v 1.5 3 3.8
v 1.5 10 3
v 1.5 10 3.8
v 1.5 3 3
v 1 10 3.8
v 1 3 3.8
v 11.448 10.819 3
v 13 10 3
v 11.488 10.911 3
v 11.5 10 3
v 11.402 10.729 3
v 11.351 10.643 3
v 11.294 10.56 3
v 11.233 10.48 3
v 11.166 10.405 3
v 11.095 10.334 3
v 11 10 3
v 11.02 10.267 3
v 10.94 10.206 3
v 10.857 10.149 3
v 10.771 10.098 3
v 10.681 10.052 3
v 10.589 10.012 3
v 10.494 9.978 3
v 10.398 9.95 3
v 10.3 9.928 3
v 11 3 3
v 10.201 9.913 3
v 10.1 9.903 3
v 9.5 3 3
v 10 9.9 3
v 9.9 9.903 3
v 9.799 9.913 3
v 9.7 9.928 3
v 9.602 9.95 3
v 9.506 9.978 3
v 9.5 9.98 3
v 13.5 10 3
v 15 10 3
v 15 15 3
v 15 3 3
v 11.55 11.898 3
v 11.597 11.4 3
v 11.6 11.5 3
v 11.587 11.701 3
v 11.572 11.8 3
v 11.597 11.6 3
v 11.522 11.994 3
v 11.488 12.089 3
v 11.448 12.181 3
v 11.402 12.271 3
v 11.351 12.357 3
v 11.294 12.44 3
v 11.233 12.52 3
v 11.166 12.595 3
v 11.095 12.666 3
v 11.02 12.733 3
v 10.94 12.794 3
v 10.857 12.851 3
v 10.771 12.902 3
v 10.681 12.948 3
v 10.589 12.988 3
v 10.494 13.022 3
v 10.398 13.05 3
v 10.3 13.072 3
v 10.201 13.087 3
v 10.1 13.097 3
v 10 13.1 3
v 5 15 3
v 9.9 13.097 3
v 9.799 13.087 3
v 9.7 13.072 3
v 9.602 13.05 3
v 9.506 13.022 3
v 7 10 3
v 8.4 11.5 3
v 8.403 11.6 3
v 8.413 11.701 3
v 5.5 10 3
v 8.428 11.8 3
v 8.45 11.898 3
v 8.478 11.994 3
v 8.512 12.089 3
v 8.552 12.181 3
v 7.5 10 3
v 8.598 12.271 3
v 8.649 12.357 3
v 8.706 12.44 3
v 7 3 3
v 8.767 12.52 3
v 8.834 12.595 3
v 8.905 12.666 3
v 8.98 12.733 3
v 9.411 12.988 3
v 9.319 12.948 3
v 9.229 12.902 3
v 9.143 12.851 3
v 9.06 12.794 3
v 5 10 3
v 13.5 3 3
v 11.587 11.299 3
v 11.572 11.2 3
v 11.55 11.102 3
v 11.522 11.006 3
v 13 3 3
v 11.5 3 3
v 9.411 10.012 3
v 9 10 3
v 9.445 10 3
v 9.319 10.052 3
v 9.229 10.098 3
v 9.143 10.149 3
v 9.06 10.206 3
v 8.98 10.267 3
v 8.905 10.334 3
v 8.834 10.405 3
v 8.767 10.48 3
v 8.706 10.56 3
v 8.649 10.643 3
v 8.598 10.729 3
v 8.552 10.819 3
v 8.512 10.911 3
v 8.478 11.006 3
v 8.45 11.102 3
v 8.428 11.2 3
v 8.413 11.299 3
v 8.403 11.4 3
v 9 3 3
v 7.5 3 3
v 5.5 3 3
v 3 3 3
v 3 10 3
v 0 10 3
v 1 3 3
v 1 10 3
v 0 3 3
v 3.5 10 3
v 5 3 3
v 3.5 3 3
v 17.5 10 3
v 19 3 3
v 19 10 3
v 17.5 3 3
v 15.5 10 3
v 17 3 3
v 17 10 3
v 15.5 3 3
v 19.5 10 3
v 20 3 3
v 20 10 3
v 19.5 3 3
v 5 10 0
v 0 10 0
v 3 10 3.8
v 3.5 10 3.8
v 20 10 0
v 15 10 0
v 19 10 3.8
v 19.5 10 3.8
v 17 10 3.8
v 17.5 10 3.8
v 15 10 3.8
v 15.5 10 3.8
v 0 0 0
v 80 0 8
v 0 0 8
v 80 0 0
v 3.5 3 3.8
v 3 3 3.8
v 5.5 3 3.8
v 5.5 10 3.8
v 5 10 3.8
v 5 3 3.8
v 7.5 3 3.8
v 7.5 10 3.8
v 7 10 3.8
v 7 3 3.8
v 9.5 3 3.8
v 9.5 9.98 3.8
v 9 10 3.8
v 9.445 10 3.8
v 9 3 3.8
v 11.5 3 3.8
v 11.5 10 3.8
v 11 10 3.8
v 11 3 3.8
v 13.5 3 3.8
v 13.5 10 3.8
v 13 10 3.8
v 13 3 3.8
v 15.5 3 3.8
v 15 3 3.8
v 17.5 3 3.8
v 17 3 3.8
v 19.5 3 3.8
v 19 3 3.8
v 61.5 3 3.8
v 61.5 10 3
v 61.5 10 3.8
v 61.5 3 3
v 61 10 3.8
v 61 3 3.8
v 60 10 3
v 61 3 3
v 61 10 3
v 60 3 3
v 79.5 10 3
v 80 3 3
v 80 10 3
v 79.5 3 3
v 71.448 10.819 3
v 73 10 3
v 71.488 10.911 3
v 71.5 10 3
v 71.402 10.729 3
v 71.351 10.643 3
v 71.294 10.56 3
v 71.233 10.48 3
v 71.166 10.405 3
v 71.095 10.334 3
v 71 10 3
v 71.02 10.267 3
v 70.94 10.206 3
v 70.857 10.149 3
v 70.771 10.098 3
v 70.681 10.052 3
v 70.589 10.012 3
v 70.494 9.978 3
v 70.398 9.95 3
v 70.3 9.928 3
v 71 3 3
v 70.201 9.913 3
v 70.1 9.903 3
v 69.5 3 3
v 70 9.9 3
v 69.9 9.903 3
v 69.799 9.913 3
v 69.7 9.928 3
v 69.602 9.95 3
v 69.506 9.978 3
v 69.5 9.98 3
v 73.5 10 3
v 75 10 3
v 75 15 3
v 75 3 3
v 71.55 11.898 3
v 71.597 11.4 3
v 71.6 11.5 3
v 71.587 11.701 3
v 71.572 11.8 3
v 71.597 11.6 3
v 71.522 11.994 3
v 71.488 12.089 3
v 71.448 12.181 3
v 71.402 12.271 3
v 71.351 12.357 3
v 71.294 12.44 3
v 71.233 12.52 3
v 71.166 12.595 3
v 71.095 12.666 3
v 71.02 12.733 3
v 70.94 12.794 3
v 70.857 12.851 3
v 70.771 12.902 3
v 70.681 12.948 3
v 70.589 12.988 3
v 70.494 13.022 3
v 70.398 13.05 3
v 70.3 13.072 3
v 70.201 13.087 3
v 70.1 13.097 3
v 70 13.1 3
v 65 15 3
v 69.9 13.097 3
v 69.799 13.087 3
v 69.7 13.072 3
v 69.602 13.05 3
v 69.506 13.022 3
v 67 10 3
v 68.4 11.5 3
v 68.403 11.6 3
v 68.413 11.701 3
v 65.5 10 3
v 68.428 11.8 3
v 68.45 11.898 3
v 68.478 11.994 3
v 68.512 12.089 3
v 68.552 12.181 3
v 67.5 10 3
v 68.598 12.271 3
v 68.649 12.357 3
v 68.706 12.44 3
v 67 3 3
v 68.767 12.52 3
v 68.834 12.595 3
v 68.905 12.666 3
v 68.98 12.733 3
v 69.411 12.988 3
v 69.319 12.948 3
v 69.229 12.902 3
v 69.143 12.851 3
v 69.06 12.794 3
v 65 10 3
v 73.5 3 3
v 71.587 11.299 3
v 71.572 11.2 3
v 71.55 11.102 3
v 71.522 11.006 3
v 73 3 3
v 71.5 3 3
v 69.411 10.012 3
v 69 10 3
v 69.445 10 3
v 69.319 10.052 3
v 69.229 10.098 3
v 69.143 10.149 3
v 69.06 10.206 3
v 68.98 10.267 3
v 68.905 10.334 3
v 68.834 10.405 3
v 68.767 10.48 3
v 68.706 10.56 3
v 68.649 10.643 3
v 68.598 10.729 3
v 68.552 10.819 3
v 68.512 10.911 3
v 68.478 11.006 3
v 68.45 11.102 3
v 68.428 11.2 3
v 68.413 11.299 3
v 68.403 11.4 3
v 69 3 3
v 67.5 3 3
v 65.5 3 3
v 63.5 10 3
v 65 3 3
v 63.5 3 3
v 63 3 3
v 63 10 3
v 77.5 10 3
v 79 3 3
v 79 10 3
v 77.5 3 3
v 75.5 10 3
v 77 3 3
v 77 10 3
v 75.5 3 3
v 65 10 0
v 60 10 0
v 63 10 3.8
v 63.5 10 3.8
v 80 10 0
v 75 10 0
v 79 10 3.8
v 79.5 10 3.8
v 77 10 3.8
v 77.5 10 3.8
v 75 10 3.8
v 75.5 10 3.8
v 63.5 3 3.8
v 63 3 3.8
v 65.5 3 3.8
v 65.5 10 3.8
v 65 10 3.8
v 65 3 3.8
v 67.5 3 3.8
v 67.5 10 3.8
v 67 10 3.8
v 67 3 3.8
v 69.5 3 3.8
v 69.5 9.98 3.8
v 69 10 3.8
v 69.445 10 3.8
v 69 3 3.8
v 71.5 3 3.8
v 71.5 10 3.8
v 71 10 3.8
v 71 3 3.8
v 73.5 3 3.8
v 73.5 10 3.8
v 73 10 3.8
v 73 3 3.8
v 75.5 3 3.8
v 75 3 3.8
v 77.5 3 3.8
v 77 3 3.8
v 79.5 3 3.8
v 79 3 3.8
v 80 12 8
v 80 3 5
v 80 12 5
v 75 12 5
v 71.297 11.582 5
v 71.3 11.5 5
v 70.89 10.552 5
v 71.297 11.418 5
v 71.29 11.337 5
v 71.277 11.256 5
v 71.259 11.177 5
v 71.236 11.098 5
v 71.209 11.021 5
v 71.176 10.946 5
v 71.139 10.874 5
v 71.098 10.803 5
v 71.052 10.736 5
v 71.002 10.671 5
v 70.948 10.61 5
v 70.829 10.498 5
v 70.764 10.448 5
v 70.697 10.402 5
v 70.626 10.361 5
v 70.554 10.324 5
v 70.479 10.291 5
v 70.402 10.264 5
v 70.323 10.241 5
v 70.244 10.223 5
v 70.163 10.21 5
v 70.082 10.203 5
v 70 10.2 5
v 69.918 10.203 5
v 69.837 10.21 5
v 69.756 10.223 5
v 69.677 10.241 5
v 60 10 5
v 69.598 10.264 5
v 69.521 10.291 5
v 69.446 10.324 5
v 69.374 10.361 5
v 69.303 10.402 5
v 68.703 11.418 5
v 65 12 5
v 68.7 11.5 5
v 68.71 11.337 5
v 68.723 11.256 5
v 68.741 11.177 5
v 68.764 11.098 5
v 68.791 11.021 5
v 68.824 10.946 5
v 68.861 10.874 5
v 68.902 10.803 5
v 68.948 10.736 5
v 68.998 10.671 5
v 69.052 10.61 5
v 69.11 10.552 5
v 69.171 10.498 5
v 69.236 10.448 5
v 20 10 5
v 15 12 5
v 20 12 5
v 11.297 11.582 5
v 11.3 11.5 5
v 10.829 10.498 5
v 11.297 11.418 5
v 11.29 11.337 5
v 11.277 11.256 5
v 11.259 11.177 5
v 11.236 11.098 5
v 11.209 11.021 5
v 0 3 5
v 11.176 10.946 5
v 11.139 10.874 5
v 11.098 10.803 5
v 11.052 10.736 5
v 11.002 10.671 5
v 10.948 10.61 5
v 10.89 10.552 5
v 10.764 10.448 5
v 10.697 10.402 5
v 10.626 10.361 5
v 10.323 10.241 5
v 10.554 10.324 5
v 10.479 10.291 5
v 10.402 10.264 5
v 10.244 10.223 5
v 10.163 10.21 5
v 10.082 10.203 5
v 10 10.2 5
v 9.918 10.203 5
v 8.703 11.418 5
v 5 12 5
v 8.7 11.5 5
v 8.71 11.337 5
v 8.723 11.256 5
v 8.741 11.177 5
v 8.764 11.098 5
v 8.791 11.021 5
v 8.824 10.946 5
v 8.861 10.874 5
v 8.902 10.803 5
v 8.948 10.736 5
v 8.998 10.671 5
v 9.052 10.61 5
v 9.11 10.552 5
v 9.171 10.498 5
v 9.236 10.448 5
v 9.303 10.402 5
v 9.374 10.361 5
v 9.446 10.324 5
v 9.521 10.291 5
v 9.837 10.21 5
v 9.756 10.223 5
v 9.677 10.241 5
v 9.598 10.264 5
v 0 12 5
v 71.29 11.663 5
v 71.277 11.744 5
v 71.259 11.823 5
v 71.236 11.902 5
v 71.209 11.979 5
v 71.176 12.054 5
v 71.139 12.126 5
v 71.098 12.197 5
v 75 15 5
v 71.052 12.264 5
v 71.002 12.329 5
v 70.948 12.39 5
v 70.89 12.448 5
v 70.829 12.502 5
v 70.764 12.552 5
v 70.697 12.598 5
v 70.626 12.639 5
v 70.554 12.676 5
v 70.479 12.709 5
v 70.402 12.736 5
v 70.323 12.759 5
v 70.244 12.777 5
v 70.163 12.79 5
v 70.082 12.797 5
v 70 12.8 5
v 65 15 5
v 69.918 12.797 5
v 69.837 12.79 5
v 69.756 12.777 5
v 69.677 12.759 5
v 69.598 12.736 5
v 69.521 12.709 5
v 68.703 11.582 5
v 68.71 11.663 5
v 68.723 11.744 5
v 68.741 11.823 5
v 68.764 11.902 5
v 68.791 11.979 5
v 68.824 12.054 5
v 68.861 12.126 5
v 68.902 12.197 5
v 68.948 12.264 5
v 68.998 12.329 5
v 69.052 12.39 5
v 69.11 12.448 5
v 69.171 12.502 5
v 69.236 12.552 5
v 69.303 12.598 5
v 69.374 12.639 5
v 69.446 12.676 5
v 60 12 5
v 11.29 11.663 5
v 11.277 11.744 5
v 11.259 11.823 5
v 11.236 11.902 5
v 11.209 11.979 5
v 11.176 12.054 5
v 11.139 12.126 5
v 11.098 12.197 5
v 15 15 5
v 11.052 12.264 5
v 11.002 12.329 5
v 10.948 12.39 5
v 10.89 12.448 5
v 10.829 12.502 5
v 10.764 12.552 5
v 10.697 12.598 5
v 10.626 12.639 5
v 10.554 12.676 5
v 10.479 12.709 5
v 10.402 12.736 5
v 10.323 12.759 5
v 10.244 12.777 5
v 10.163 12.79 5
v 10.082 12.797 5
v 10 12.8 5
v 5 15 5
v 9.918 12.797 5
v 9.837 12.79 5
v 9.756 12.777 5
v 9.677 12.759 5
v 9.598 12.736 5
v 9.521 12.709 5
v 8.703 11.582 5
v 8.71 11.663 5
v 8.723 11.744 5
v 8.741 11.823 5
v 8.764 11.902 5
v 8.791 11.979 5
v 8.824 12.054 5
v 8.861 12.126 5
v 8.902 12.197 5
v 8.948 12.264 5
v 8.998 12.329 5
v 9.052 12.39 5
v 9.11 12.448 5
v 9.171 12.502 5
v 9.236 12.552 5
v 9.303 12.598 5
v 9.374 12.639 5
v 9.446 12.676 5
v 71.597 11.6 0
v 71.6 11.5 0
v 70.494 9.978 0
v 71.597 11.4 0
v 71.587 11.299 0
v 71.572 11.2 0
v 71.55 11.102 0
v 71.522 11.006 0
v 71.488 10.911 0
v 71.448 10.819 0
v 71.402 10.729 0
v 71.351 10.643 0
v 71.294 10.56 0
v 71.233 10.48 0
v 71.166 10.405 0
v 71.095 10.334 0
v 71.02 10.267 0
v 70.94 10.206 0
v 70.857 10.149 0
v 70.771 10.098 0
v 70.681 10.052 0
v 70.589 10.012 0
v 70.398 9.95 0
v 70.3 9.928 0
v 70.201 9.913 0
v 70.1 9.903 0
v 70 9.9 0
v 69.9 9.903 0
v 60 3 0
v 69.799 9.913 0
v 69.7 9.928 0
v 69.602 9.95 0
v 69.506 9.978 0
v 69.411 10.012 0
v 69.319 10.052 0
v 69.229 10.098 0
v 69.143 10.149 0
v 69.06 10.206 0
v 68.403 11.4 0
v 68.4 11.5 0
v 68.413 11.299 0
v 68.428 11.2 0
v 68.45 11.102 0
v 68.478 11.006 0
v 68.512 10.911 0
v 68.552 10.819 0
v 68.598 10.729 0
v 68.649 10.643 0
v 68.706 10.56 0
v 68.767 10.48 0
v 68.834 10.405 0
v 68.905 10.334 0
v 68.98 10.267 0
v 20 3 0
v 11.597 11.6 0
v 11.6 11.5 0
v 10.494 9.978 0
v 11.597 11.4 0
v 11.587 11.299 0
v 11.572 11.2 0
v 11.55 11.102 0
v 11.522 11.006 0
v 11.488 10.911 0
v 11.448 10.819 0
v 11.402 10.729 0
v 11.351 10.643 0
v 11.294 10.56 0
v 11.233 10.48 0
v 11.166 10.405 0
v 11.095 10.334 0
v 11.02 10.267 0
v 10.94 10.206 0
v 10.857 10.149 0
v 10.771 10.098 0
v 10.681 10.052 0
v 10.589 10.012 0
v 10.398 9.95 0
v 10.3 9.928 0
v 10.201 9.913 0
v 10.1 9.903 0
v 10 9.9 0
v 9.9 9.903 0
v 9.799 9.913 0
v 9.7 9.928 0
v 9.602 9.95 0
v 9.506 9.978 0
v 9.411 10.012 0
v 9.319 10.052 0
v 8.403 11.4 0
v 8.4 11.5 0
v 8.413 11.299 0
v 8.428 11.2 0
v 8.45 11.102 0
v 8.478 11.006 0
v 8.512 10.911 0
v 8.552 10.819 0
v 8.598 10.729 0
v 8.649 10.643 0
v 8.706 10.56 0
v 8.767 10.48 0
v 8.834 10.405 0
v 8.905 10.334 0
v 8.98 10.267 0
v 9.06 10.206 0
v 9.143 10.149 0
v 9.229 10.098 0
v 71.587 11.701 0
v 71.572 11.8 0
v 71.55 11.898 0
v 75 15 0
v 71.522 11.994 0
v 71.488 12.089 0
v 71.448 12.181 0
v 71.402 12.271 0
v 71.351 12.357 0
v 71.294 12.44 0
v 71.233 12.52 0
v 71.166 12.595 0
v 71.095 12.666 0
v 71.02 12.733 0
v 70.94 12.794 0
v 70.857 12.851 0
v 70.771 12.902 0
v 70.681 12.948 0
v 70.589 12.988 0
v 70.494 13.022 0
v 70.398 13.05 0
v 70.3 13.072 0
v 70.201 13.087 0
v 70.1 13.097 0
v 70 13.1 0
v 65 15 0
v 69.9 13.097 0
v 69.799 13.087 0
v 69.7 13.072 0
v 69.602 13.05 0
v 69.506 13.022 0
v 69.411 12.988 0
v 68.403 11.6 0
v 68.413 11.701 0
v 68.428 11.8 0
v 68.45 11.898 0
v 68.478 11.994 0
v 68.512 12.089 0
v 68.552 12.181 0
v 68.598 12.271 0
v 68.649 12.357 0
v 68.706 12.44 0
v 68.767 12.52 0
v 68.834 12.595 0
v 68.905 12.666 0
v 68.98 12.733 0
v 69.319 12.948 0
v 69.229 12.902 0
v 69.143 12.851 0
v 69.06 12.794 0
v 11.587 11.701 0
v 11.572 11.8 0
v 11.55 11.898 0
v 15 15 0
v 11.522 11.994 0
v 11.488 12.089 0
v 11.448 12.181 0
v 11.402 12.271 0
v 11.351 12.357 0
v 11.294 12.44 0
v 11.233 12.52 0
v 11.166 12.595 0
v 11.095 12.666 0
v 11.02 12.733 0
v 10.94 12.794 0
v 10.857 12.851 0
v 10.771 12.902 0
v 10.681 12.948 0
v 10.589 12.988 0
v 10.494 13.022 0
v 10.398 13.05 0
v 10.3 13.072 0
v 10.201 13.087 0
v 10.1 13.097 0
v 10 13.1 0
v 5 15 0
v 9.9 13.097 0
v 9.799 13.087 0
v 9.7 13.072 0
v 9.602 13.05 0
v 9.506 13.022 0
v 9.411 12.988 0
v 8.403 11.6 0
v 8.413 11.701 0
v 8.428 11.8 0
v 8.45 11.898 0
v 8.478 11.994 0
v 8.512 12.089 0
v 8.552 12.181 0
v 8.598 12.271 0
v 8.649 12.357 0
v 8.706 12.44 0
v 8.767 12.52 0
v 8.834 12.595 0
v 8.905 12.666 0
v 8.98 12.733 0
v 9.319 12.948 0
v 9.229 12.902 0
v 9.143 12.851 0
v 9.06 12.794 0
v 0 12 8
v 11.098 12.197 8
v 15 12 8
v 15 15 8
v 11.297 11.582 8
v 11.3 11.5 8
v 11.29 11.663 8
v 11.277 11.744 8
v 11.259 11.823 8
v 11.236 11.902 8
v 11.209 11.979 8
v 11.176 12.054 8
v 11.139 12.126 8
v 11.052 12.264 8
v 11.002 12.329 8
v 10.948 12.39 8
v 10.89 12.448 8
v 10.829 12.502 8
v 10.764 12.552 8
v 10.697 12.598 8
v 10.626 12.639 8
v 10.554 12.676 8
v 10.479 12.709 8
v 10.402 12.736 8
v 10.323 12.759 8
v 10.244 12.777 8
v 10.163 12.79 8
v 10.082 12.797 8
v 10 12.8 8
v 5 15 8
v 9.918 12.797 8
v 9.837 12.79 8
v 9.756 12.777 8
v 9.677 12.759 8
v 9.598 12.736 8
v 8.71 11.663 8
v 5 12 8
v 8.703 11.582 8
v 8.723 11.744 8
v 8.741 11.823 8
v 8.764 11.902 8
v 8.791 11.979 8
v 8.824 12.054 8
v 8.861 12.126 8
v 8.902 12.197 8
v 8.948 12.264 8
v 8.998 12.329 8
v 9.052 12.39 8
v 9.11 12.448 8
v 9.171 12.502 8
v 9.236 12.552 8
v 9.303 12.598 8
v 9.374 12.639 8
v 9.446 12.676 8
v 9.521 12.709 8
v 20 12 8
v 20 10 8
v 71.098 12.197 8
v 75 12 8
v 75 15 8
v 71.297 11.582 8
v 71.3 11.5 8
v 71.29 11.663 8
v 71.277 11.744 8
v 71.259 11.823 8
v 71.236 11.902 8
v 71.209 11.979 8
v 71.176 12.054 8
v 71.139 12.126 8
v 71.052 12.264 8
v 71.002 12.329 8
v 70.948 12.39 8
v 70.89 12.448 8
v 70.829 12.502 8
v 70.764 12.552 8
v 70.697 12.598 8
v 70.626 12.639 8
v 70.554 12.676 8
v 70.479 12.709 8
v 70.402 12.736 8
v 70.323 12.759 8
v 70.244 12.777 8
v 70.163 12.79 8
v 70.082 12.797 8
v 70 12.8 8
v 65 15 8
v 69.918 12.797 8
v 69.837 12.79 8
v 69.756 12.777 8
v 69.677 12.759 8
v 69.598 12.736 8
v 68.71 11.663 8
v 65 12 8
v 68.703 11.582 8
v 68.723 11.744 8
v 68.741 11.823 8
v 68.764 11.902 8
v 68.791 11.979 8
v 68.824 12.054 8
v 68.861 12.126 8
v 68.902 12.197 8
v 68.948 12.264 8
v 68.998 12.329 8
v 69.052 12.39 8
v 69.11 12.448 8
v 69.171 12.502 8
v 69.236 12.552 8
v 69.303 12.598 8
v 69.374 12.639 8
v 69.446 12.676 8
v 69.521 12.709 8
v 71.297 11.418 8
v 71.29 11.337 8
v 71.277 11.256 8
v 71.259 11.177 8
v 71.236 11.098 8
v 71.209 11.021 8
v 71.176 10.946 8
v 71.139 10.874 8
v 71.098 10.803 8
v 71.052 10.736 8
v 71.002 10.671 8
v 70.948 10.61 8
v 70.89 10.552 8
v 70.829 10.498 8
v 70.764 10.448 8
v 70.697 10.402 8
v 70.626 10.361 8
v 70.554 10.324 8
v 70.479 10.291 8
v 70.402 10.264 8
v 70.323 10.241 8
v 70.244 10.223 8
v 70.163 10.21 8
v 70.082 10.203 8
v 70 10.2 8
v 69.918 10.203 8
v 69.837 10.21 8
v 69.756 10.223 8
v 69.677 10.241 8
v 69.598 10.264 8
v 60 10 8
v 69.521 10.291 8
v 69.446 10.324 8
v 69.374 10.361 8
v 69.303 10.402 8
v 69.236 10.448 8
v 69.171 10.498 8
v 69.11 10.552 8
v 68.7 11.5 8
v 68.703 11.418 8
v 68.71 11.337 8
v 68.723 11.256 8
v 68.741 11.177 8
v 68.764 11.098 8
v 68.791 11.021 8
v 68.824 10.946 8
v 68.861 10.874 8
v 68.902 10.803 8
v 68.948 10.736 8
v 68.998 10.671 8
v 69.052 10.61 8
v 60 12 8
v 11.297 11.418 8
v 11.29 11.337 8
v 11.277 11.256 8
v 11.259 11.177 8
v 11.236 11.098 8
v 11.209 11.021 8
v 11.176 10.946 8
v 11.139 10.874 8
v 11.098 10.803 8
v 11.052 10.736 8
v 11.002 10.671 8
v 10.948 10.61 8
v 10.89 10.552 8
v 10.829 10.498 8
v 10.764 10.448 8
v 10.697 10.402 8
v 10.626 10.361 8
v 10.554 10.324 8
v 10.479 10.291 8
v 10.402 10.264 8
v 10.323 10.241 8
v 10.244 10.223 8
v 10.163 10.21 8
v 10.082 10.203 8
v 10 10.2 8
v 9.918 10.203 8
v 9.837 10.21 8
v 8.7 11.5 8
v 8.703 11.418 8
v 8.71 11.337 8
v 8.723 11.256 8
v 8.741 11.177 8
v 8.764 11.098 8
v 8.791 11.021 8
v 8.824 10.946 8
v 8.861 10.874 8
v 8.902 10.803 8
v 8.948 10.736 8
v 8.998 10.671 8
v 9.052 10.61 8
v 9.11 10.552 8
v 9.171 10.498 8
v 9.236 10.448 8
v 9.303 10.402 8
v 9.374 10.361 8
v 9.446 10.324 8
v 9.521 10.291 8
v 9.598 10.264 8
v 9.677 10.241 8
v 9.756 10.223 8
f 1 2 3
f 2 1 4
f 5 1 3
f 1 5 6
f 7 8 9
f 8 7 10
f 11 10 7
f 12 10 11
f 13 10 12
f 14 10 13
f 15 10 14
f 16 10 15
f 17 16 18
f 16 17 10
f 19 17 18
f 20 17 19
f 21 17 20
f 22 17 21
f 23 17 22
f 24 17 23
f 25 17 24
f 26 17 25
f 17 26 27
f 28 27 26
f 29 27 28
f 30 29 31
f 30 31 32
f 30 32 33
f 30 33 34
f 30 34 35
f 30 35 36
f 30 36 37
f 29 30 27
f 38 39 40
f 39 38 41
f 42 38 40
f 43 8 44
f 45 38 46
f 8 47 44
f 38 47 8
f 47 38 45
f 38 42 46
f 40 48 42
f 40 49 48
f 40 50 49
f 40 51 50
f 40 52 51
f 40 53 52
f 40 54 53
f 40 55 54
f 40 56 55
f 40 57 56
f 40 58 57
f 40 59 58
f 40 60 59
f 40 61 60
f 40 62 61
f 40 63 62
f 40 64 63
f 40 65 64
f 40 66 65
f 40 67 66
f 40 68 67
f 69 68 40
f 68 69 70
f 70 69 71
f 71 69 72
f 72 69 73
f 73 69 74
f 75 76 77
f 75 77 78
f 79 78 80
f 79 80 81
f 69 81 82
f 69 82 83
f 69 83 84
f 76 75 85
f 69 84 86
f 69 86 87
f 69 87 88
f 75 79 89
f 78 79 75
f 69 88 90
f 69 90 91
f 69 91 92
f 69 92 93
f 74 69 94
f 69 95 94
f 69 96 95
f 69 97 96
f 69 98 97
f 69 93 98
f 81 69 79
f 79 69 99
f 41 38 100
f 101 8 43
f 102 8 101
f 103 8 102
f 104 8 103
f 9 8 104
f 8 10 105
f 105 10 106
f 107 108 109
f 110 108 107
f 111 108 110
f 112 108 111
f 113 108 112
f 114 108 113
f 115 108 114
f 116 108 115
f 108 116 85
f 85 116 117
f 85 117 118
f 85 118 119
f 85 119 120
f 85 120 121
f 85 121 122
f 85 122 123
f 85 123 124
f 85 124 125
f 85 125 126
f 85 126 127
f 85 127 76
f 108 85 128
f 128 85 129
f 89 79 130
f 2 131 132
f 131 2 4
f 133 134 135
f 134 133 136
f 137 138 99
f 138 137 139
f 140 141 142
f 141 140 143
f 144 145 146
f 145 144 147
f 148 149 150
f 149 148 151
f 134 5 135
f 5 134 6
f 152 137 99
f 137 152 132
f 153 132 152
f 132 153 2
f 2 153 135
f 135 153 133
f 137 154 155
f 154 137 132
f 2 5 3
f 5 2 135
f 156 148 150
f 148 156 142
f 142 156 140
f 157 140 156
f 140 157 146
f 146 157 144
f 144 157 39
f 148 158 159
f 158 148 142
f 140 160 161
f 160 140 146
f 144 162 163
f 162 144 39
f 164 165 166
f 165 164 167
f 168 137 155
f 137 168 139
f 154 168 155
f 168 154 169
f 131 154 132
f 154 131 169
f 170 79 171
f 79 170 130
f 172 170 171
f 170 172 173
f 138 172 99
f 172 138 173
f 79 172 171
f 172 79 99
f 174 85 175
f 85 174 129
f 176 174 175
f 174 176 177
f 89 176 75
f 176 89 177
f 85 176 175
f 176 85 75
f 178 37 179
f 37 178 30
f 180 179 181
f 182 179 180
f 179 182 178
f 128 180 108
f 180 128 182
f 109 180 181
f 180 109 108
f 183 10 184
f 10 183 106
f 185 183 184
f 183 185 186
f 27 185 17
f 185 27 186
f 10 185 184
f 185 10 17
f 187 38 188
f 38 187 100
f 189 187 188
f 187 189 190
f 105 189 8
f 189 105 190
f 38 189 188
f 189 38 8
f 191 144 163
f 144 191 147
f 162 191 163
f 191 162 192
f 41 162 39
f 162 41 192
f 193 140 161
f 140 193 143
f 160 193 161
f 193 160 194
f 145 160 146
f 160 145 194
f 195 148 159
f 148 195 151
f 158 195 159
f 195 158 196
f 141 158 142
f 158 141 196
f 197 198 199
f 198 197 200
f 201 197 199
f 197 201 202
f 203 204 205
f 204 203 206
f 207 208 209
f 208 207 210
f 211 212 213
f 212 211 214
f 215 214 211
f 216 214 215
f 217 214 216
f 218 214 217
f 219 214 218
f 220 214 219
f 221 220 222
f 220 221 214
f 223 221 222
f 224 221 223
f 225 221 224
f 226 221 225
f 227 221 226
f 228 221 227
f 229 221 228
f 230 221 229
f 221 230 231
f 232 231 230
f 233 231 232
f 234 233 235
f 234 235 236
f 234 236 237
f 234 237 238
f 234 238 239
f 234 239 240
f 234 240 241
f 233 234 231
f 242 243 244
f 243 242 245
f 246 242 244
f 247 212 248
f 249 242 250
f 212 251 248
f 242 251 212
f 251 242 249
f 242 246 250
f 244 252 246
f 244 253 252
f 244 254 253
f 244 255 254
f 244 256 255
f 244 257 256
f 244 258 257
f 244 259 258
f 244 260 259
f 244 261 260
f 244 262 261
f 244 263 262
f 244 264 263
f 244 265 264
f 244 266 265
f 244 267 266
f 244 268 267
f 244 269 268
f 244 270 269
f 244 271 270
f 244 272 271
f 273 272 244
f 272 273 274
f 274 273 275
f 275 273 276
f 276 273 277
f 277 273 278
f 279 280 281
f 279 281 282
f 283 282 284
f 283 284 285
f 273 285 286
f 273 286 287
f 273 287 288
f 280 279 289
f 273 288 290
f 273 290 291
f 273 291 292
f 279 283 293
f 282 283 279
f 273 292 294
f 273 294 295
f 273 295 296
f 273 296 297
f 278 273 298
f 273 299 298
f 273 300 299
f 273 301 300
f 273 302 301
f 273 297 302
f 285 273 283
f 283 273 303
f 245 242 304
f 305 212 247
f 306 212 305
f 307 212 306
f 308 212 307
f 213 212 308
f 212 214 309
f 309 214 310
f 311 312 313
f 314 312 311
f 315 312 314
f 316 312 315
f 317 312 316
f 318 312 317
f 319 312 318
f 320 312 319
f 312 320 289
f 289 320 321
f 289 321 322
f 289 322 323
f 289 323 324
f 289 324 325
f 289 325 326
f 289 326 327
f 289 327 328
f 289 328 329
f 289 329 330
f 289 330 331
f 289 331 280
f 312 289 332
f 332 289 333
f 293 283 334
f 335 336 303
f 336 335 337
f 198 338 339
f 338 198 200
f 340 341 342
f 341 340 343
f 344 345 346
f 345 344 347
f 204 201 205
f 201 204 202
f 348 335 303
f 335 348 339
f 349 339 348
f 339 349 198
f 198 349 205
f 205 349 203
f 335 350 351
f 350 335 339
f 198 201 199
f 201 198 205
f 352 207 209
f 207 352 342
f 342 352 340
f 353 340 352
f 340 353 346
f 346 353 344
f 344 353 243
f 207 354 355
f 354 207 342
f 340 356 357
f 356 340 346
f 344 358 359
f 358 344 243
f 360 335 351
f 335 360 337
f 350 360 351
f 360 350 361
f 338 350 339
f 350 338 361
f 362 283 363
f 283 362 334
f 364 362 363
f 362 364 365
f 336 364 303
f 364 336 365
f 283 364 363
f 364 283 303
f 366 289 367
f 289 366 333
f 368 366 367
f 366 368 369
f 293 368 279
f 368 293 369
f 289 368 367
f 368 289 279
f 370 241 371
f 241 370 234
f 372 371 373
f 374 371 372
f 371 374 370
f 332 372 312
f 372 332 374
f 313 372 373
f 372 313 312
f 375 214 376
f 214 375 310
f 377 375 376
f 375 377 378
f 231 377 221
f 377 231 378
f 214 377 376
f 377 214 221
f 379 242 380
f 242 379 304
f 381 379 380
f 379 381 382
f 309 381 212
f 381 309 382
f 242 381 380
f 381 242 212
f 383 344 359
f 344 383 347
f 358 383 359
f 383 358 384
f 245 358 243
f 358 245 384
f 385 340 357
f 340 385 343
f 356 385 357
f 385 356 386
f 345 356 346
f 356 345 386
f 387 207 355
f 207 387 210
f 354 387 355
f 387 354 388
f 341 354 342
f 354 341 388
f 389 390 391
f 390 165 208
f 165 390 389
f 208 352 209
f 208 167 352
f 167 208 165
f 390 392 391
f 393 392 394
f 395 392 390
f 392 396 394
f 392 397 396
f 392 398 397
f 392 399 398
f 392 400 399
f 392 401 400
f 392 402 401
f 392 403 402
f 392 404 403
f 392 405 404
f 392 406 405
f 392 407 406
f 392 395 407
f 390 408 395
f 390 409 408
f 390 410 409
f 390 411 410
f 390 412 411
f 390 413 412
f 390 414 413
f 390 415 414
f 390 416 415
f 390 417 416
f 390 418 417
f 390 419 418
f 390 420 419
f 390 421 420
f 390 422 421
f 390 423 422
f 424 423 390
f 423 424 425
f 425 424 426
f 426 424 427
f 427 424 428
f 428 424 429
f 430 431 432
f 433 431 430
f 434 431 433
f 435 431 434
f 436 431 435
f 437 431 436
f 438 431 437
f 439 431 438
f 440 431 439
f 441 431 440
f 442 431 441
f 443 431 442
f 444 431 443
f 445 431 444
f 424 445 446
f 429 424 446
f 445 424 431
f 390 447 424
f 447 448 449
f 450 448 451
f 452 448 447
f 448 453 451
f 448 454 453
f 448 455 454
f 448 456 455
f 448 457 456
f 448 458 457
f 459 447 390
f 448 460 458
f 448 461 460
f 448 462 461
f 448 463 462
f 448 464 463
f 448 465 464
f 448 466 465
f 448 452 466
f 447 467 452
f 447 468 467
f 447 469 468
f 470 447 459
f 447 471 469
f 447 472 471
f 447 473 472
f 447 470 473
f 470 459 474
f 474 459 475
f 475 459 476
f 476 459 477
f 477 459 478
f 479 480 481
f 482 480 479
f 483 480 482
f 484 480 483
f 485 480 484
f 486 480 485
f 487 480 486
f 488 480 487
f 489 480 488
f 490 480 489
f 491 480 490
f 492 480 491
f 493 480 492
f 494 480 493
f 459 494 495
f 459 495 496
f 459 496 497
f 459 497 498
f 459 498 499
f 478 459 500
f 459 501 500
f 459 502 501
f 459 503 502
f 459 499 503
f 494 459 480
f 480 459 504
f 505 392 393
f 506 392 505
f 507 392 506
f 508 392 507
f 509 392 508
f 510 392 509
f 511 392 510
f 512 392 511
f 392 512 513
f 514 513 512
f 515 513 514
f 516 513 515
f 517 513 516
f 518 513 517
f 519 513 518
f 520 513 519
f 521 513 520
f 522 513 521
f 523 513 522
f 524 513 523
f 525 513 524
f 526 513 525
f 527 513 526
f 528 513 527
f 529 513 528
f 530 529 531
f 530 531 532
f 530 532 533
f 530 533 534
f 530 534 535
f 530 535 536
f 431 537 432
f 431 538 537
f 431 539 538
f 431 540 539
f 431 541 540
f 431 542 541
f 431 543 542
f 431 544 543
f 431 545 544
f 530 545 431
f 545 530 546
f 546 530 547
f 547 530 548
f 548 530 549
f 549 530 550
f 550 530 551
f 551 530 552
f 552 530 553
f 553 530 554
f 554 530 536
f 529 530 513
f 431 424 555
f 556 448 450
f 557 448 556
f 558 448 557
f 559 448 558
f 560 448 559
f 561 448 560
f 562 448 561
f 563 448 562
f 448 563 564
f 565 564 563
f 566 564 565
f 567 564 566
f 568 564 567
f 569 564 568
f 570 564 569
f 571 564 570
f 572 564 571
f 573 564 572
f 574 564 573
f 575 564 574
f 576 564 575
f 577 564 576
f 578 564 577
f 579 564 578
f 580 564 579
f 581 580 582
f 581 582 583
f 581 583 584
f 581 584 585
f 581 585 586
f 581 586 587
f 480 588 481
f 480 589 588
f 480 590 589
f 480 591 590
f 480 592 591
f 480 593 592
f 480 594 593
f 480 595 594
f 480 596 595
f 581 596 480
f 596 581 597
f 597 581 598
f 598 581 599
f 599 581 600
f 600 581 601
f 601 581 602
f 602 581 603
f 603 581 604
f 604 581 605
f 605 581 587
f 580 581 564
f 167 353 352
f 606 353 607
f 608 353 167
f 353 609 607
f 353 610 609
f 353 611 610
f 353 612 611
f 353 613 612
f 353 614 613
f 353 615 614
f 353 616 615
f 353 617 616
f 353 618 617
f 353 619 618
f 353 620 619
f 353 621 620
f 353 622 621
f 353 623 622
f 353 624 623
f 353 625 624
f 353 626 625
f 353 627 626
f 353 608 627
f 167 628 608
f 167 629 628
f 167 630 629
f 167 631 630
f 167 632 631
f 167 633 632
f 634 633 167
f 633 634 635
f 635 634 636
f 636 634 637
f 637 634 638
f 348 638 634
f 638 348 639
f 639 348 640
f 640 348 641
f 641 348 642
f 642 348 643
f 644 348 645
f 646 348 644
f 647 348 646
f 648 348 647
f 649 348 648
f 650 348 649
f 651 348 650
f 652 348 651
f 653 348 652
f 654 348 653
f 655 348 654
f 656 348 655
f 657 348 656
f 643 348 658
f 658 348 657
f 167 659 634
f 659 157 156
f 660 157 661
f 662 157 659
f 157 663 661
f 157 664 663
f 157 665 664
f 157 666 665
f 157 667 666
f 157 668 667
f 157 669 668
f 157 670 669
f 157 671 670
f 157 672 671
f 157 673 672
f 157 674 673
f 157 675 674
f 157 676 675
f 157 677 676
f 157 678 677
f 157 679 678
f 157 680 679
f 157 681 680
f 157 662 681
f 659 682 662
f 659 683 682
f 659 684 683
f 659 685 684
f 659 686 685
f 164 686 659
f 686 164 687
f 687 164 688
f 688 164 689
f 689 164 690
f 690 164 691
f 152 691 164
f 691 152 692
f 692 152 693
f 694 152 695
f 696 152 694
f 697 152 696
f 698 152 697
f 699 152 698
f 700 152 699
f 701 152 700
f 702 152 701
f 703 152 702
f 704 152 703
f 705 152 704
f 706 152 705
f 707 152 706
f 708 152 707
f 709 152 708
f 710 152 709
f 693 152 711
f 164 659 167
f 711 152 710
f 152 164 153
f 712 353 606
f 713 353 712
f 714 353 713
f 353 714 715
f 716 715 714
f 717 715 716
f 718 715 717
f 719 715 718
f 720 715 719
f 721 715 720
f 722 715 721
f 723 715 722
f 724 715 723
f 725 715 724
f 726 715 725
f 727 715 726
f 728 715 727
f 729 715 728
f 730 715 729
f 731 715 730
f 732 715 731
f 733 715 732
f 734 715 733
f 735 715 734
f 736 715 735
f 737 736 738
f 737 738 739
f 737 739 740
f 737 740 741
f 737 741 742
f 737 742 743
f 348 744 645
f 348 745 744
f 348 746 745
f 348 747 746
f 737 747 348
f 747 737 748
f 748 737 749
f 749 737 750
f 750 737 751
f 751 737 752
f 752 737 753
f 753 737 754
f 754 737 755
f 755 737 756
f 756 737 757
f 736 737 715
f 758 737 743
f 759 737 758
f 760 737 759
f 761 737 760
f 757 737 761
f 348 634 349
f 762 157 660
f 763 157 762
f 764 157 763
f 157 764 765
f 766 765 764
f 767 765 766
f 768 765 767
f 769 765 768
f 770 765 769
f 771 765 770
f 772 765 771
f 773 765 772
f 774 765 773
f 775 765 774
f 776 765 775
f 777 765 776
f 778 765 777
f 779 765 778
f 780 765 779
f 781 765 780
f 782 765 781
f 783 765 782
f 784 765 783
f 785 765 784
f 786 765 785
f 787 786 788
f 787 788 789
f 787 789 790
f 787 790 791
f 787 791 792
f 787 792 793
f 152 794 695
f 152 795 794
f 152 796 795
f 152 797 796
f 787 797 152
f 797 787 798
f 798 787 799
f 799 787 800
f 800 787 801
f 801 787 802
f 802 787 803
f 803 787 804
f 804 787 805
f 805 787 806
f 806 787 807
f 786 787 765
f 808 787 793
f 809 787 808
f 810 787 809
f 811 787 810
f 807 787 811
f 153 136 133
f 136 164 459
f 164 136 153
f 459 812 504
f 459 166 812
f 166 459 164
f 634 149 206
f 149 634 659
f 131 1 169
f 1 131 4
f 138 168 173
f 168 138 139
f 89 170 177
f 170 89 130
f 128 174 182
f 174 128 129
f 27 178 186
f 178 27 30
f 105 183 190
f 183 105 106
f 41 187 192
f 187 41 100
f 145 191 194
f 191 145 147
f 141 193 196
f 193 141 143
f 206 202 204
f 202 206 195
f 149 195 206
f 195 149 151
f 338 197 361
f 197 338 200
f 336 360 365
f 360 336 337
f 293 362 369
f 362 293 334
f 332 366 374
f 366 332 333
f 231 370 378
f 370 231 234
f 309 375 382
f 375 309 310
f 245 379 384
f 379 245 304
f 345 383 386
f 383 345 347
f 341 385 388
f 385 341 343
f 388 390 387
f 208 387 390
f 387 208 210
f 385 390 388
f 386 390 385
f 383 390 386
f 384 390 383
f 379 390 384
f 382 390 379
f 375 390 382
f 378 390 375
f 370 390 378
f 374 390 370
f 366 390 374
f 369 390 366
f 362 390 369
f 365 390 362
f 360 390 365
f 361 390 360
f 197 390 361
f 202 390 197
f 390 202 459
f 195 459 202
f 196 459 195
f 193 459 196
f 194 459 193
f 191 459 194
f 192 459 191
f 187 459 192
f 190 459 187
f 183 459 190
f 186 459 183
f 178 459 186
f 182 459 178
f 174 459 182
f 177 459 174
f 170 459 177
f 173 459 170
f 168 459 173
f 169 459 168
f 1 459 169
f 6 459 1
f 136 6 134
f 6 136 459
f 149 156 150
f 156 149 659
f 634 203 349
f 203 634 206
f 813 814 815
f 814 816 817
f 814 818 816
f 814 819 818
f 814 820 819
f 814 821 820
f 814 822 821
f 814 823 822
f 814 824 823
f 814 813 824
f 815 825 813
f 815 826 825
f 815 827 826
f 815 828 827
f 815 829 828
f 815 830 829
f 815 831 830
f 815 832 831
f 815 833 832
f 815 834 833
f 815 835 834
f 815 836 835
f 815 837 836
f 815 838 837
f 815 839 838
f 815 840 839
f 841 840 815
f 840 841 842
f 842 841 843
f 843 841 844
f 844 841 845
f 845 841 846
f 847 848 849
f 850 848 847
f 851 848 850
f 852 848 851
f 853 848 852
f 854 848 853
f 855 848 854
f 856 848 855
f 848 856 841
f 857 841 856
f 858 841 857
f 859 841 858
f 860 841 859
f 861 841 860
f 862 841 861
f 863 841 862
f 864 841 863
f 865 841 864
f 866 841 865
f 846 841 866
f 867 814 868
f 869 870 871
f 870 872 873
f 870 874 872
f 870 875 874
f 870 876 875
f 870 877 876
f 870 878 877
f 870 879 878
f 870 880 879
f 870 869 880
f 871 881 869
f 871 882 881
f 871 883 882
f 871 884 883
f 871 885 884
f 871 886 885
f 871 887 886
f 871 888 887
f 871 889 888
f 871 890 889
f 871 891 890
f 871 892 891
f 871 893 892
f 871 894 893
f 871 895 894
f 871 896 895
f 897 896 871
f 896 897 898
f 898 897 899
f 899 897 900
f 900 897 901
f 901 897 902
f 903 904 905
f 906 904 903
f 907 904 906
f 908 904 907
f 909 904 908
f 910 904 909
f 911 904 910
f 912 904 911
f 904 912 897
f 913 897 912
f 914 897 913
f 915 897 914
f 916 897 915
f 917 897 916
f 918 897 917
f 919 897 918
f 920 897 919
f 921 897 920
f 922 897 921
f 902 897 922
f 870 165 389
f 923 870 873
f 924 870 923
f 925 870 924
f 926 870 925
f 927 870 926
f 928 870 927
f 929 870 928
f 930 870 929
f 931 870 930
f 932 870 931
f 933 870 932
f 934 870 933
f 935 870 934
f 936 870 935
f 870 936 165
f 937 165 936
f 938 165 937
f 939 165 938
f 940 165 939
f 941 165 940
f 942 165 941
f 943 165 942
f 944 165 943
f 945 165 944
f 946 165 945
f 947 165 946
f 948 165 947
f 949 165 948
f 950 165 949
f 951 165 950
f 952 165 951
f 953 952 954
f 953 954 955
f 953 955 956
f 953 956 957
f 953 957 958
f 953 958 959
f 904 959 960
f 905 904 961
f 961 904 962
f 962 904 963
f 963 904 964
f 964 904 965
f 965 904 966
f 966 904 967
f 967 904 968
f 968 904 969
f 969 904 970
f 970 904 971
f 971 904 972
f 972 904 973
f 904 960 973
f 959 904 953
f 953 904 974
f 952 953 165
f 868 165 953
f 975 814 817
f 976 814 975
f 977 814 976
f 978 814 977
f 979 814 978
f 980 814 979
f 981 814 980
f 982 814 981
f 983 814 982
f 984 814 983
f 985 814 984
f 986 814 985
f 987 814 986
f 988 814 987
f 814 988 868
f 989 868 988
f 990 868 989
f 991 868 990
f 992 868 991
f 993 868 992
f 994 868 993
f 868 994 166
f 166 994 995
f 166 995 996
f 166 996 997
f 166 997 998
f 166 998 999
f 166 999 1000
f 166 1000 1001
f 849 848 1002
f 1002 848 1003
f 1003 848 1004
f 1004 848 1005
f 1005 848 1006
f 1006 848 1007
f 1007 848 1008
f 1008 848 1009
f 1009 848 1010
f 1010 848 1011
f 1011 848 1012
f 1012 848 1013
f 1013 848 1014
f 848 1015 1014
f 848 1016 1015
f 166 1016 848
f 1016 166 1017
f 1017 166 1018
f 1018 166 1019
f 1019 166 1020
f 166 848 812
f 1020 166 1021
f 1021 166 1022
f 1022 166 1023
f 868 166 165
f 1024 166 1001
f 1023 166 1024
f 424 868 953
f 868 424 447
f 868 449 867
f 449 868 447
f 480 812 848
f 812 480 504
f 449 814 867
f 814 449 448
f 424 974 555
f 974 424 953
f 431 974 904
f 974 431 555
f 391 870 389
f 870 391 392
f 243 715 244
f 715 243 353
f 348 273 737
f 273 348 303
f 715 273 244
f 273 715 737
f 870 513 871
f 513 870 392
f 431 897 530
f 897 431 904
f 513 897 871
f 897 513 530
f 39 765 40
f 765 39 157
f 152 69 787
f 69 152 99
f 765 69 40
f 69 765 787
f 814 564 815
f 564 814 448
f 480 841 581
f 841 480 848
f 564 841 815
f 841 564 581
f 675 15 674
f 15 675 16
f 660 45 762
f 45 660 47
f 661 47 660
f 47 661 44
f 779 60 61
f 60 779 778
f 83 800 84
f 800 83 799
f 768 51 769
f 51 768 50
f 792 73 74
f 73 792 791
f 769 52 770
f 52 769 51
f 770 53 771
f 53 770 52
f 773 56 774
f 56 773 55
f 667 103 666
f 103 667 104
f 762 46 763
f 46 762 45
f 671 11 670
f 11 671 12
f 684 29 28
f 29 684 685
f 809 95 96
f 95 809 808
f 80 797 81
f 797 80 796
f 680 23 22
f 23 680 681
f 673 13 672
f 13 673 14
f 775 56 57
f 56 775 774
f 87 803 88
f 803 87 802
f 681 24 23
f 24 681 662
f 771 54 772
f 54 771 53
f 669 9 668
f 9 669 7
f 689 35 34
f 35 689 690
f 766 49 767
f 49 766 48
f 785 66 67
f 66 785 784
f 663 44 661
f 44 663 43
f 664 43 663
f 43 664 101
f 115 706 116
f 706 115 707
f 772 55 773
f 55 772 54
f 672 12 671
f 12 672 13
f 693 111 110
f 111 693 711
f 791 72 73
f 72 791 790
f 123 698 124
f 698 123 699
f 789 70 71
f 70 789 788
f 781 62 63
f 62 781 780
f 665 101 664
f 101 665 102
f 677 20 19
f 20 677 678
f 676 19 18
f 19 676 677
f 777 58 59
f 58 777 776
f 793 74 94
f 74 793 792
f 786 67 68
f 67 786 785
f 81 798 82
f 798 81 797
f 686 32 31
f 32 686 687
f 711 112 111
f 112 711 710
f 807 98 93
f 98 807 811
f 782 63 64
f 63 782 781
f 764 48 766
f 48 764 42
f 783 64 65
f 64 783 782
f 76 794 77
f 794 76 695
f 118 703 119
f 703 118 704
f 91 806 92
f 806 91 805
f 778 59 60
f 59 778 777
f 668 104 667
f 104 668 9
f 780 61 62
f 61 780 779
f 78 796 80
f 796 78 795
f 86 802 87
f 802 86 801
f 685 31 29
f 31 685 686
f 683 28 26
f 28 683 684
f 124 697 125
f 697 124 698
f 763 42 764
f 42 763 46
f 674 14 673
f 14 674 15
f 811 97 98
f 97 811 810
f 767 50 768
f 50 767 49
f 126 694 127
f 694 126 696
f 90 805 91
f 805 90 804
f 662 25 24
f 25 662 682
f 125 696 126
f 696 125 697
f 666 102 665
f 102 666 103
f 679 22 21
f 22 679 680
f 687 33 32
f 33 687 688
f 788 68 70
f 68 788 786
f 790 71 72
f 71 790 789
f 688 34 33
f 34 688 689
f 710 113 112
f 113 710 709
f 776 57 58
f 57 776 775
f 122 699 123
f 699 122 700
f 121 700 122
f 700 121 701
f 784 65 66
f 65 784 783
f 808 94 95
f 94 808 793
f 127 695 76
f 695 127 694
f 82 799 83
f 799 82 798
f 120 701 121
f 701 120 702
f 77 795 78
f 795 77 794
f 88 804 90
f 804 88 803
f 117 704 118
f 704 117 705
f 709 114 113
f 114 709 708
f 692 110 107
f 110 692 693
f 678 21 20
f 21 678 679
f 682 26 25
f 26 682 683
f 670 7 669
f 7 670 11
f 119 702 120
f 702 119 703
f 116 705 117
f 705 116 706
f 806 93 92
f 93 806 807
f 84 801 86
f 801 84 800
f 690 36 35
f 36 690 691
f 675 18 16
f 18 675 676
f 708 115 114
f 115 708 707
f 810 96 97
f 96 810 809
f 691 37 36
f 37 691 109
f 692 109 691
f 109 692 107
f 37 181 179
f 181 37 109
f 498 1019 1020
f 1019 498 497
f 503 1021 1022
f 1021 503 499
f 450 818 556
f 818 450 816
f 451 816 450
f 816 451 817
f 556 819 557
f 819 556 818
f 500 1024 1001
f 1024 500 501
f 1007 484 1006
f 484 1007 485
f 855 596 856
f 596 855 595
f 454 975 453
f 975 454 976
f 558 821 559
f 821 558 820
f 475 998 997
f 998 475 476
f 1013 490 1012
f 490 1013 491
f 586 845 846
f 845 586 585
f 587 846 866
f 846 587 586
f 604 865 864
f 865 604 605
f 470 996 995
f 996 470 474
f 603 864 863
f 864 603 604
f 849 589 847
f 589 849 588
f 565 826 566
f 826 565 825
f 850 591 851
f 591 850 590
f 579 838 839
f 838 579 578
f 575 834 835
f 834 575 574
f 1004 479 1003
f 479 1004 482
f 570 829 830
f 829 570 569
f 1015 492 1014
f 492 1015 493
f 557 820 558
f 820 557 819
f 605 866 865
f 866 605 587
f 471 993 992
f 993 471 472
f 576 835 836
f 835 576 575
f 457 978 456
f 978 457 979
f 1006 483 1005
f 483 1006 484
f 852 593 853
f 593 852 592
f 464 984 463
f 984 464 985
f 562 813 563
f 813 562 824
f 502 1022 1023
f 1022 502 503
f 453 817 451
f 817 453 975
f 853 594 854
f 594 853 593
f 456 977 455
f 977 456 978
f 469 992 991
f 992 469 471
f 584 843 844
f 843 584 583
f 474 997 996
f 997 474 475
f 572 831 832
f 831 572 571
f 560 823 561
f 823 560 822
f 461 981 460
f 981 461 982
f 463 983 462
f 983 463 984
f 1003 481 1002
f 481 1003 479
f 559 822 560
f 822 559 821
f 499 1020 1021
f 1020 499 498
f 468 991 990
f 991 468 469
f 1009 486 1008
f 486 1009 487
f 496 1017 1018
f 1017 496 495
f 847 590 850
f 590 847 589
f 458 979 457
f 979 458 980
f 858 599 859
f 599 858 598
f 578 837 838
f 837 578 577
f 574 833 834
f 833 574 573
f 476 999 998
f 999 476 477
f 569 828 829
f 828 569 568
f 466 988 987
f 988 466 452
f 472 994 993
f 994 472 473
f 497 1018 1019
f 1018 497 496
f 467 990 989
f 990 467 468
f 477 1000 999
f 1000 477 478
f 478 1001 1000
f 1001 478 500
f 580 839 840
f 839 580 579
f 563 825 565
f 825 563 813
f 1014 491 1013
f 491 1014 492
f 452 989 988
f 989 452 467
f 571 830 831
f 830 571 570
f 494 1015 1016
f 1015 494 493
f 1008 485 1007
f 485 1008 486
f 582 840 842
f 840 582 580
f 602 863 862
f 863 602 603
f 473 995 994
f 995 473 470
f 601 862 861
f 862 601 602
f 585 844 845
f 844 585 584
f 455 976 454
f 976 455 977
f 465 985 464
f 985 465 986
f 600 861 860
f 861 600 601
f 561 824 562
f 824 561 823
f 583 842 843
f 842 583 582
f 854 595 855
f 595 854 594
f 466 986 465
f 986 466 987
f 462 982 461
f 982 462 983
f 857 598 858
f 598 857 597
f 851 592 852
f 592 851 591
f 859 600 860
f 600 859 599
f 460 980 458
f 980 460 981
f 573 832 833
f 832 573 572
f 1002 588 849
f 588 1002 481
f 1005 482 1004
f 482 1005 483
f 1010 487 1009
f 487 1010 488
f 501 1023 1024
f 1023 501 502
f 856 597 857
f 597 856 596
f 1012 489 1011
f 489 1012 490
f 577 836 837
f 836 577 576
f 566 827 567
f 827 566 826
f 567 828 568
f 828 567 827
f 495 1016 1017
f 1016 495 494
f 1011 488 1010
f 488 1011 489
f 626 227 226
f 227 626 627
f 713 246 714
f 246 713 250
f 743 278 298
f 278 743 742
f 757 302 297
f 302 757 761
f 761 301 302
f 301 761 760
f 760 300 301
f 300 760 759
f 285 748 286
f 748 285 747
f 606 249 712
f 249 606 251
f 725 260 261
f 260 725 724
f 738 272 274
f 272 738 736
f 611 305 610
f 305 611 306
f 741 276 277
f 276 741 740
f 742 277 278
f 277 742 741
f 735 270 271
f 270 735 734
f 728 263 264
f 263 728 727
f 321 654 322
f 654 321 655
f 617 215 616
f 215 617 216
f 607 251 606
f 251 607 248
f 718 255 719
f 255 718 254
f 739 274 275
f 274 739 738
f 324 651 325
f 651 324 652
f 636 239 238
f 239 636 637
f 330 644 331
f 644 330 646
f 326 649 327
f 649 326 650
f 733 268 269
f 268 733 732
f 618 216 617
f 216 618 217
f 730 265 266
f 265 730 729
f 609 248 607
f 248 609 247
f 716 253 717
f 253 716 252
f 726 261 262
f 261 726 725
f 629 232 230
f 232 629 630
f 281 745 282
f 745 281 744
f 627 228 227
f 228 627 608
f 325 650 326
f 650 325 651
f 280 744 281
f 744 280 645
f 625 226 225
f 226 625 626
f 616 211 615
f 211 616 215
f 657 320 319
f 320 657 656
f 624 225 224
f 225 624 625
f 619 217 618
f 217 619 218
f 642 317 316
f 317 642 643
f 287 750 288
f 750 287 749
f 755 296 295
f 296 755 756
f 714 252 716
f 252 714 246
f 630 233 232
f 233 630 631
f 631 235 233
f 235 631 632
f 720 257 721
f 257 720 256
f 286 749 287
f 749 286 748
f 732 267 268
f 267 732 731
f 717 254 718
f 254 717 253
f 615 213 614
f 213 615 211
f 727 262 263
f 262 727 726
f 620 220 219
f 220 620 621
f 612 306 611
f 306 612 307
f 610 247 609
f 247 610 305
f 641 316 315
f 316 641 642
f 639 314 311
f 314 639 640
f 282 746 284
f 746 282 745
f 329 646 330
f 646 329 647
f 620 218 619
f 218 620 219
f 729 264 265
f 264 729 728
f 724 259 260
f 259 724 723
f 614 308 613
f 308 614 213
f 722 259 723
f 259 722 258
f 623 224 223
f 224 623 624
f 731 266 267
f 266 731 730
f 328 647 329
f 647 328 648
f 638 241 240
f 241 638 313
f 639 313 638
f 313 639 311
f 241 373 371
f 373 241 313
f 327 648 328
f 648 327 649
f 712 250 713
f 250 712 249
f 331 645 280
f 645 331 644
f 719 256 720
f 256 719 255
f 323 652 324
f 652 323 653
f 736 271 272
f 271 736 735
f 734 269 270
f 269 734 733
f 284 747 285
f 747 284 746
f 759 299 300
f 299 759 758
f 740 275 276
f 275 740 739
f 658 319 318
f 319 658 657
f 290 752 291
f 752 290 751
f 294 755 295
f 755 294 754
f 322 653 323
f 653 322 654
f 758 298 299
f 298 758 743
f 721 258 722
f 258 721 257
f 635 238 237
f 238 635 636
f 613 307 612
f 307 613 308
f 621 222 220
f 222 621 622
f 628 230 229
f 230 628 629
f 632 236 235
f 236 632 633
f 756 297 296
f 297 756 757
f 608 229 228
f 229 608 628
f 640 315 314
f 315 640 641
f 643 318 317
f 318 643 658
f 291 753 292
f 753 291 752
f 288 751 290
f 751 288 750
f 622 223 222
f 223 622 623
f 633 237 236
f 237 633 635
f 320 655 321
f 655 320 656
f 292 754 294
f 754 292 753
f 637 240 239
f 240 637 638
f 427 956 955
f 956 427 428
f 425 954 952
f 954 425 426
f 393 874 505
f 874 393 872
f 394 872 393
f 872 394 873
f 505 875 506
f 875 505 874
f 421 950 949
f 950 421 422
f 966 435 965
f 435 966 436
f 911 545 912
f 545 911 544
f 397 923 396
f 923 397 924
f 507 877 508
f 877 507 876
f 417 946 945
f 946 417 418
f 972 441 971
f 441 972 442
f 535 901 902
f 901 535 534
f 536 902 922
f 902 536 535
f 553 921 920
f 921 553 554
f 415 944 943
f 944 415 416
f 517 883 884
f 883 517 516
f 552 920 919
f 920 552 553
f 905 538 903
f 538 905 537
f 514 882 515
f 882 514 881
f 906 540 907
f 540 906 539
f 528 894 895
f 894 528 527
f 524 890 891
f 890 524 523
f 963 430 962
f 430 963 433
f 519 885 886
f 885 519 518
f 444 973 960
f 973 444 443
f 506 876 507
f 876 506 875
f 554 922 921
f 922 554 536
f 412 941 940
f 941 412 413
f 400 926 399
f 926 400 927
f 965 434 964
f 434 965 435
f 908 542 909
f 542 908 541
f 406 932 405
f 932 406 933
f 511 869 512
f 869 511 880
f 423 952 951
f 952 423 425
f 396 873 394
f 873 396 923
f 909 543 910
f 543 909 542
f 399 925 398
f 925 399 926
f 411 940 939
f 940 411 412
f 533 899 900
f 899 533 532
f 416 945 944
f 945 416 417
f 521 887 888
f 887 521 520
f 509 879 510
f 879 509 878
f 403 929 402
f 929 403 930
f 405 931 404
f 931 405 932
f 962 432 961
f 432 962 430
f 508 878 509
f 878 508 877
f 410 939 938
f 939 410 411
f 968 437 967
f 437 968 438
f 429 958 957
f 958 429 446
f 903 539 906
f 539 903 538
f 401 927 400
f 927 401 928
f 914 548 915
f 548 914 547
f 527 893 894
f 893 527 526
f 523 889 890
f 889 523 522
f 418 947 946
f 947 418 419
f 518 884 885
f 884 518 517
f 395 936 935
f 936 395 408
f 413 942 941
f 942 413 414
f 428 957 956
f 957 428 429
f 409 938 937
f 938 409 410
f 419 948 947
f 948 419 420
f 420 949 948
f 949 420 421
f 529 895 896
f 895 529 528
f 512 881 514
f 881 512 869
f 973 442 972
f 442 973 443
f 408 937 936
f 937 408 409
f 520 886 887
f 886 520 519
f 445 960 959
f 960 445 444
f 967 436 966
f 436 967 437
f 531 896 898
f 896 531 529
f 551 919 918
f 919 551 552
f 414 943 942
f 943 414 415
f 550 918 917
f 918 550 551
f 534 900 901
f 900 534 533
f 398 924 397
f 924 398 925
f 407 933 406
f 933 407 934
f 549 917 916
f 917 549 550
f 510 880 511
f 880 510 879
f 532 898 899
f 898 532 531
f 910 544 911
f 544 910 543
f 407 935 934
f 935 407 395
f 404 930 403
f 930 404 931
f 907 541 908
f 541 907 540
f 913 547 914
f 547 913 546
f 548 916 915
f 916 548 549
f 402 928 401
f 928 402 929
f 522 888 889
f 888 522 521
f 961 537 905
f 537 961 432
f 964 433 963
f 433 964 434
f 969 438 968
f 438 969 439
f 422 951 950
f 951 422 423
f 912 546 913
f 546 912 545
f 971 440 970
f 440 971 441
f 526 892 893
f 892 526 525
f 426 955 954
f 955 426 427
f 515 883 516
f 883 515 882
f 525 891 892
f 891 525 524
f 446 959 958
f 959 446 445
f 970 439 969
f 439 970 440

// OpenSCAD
difference(){
	union(){         
        translate([0,0,0]){
           cube([80,3,5], center=false);
        }
        translate([0,0,0]){
           cube([20,10,3], center=false);
        }
        translate([60,0,0]){
           cube([20,10,3], center=false);
        }

        translate([0,0,5]){
           cube([80,10,3], center=false);
        }


        translate([0,0,5]){
           cube([20,12,3], center=false);
        }
        translate([60,0,5]){
           cube([20,12,3], center=false);
        }


        translate([65,0,0]){
           cube([10,15,3], center=false);
        }
        translate([65,0,5]){
           cube([10,15,3], center=false);
        }
        translate([5,0,0]){
           cube([10,15,3], center=false);
        }
        translate([5,0,5]){
           cube([10,15,3], center=false);
        }

        
        for (x = [0:9]){
            translate([1+x*2,0,3]){
               cube([0.5,10,0.8], center=false);
            }
        }
        for (x = [0:9]){
            translate([61+x*2,0,3]){
               cube([0.5,10,0.8], center=false);
            }
        }
       
        
	}
	union() {
        translate([10,11.5,-1]){
            rotate(a = [0,0,0]) {
                cylinder(h=5.5, r=1.6, $fn=100, center=false);
            }
        }	
        translate([10,11.5,4]){
            rotate(a = [0,0,0]) {
                cylinder(h=5.5, r=1.3, $fn=100, center=false);
            }
        }	
        
        translate([70,11.5,-1]){
            rotate(a = [0,0,0]) {
                cylinder(h=5.5, r=1.6, $fn=100, center=false);
            }
        }	
        translate([70,11.5,4]){
            rotate(a = [0,0,0]) {
                cylinder(h=5.5, r=1.3, $fn=100, center=false);
            }
        }	
        
	}
}
